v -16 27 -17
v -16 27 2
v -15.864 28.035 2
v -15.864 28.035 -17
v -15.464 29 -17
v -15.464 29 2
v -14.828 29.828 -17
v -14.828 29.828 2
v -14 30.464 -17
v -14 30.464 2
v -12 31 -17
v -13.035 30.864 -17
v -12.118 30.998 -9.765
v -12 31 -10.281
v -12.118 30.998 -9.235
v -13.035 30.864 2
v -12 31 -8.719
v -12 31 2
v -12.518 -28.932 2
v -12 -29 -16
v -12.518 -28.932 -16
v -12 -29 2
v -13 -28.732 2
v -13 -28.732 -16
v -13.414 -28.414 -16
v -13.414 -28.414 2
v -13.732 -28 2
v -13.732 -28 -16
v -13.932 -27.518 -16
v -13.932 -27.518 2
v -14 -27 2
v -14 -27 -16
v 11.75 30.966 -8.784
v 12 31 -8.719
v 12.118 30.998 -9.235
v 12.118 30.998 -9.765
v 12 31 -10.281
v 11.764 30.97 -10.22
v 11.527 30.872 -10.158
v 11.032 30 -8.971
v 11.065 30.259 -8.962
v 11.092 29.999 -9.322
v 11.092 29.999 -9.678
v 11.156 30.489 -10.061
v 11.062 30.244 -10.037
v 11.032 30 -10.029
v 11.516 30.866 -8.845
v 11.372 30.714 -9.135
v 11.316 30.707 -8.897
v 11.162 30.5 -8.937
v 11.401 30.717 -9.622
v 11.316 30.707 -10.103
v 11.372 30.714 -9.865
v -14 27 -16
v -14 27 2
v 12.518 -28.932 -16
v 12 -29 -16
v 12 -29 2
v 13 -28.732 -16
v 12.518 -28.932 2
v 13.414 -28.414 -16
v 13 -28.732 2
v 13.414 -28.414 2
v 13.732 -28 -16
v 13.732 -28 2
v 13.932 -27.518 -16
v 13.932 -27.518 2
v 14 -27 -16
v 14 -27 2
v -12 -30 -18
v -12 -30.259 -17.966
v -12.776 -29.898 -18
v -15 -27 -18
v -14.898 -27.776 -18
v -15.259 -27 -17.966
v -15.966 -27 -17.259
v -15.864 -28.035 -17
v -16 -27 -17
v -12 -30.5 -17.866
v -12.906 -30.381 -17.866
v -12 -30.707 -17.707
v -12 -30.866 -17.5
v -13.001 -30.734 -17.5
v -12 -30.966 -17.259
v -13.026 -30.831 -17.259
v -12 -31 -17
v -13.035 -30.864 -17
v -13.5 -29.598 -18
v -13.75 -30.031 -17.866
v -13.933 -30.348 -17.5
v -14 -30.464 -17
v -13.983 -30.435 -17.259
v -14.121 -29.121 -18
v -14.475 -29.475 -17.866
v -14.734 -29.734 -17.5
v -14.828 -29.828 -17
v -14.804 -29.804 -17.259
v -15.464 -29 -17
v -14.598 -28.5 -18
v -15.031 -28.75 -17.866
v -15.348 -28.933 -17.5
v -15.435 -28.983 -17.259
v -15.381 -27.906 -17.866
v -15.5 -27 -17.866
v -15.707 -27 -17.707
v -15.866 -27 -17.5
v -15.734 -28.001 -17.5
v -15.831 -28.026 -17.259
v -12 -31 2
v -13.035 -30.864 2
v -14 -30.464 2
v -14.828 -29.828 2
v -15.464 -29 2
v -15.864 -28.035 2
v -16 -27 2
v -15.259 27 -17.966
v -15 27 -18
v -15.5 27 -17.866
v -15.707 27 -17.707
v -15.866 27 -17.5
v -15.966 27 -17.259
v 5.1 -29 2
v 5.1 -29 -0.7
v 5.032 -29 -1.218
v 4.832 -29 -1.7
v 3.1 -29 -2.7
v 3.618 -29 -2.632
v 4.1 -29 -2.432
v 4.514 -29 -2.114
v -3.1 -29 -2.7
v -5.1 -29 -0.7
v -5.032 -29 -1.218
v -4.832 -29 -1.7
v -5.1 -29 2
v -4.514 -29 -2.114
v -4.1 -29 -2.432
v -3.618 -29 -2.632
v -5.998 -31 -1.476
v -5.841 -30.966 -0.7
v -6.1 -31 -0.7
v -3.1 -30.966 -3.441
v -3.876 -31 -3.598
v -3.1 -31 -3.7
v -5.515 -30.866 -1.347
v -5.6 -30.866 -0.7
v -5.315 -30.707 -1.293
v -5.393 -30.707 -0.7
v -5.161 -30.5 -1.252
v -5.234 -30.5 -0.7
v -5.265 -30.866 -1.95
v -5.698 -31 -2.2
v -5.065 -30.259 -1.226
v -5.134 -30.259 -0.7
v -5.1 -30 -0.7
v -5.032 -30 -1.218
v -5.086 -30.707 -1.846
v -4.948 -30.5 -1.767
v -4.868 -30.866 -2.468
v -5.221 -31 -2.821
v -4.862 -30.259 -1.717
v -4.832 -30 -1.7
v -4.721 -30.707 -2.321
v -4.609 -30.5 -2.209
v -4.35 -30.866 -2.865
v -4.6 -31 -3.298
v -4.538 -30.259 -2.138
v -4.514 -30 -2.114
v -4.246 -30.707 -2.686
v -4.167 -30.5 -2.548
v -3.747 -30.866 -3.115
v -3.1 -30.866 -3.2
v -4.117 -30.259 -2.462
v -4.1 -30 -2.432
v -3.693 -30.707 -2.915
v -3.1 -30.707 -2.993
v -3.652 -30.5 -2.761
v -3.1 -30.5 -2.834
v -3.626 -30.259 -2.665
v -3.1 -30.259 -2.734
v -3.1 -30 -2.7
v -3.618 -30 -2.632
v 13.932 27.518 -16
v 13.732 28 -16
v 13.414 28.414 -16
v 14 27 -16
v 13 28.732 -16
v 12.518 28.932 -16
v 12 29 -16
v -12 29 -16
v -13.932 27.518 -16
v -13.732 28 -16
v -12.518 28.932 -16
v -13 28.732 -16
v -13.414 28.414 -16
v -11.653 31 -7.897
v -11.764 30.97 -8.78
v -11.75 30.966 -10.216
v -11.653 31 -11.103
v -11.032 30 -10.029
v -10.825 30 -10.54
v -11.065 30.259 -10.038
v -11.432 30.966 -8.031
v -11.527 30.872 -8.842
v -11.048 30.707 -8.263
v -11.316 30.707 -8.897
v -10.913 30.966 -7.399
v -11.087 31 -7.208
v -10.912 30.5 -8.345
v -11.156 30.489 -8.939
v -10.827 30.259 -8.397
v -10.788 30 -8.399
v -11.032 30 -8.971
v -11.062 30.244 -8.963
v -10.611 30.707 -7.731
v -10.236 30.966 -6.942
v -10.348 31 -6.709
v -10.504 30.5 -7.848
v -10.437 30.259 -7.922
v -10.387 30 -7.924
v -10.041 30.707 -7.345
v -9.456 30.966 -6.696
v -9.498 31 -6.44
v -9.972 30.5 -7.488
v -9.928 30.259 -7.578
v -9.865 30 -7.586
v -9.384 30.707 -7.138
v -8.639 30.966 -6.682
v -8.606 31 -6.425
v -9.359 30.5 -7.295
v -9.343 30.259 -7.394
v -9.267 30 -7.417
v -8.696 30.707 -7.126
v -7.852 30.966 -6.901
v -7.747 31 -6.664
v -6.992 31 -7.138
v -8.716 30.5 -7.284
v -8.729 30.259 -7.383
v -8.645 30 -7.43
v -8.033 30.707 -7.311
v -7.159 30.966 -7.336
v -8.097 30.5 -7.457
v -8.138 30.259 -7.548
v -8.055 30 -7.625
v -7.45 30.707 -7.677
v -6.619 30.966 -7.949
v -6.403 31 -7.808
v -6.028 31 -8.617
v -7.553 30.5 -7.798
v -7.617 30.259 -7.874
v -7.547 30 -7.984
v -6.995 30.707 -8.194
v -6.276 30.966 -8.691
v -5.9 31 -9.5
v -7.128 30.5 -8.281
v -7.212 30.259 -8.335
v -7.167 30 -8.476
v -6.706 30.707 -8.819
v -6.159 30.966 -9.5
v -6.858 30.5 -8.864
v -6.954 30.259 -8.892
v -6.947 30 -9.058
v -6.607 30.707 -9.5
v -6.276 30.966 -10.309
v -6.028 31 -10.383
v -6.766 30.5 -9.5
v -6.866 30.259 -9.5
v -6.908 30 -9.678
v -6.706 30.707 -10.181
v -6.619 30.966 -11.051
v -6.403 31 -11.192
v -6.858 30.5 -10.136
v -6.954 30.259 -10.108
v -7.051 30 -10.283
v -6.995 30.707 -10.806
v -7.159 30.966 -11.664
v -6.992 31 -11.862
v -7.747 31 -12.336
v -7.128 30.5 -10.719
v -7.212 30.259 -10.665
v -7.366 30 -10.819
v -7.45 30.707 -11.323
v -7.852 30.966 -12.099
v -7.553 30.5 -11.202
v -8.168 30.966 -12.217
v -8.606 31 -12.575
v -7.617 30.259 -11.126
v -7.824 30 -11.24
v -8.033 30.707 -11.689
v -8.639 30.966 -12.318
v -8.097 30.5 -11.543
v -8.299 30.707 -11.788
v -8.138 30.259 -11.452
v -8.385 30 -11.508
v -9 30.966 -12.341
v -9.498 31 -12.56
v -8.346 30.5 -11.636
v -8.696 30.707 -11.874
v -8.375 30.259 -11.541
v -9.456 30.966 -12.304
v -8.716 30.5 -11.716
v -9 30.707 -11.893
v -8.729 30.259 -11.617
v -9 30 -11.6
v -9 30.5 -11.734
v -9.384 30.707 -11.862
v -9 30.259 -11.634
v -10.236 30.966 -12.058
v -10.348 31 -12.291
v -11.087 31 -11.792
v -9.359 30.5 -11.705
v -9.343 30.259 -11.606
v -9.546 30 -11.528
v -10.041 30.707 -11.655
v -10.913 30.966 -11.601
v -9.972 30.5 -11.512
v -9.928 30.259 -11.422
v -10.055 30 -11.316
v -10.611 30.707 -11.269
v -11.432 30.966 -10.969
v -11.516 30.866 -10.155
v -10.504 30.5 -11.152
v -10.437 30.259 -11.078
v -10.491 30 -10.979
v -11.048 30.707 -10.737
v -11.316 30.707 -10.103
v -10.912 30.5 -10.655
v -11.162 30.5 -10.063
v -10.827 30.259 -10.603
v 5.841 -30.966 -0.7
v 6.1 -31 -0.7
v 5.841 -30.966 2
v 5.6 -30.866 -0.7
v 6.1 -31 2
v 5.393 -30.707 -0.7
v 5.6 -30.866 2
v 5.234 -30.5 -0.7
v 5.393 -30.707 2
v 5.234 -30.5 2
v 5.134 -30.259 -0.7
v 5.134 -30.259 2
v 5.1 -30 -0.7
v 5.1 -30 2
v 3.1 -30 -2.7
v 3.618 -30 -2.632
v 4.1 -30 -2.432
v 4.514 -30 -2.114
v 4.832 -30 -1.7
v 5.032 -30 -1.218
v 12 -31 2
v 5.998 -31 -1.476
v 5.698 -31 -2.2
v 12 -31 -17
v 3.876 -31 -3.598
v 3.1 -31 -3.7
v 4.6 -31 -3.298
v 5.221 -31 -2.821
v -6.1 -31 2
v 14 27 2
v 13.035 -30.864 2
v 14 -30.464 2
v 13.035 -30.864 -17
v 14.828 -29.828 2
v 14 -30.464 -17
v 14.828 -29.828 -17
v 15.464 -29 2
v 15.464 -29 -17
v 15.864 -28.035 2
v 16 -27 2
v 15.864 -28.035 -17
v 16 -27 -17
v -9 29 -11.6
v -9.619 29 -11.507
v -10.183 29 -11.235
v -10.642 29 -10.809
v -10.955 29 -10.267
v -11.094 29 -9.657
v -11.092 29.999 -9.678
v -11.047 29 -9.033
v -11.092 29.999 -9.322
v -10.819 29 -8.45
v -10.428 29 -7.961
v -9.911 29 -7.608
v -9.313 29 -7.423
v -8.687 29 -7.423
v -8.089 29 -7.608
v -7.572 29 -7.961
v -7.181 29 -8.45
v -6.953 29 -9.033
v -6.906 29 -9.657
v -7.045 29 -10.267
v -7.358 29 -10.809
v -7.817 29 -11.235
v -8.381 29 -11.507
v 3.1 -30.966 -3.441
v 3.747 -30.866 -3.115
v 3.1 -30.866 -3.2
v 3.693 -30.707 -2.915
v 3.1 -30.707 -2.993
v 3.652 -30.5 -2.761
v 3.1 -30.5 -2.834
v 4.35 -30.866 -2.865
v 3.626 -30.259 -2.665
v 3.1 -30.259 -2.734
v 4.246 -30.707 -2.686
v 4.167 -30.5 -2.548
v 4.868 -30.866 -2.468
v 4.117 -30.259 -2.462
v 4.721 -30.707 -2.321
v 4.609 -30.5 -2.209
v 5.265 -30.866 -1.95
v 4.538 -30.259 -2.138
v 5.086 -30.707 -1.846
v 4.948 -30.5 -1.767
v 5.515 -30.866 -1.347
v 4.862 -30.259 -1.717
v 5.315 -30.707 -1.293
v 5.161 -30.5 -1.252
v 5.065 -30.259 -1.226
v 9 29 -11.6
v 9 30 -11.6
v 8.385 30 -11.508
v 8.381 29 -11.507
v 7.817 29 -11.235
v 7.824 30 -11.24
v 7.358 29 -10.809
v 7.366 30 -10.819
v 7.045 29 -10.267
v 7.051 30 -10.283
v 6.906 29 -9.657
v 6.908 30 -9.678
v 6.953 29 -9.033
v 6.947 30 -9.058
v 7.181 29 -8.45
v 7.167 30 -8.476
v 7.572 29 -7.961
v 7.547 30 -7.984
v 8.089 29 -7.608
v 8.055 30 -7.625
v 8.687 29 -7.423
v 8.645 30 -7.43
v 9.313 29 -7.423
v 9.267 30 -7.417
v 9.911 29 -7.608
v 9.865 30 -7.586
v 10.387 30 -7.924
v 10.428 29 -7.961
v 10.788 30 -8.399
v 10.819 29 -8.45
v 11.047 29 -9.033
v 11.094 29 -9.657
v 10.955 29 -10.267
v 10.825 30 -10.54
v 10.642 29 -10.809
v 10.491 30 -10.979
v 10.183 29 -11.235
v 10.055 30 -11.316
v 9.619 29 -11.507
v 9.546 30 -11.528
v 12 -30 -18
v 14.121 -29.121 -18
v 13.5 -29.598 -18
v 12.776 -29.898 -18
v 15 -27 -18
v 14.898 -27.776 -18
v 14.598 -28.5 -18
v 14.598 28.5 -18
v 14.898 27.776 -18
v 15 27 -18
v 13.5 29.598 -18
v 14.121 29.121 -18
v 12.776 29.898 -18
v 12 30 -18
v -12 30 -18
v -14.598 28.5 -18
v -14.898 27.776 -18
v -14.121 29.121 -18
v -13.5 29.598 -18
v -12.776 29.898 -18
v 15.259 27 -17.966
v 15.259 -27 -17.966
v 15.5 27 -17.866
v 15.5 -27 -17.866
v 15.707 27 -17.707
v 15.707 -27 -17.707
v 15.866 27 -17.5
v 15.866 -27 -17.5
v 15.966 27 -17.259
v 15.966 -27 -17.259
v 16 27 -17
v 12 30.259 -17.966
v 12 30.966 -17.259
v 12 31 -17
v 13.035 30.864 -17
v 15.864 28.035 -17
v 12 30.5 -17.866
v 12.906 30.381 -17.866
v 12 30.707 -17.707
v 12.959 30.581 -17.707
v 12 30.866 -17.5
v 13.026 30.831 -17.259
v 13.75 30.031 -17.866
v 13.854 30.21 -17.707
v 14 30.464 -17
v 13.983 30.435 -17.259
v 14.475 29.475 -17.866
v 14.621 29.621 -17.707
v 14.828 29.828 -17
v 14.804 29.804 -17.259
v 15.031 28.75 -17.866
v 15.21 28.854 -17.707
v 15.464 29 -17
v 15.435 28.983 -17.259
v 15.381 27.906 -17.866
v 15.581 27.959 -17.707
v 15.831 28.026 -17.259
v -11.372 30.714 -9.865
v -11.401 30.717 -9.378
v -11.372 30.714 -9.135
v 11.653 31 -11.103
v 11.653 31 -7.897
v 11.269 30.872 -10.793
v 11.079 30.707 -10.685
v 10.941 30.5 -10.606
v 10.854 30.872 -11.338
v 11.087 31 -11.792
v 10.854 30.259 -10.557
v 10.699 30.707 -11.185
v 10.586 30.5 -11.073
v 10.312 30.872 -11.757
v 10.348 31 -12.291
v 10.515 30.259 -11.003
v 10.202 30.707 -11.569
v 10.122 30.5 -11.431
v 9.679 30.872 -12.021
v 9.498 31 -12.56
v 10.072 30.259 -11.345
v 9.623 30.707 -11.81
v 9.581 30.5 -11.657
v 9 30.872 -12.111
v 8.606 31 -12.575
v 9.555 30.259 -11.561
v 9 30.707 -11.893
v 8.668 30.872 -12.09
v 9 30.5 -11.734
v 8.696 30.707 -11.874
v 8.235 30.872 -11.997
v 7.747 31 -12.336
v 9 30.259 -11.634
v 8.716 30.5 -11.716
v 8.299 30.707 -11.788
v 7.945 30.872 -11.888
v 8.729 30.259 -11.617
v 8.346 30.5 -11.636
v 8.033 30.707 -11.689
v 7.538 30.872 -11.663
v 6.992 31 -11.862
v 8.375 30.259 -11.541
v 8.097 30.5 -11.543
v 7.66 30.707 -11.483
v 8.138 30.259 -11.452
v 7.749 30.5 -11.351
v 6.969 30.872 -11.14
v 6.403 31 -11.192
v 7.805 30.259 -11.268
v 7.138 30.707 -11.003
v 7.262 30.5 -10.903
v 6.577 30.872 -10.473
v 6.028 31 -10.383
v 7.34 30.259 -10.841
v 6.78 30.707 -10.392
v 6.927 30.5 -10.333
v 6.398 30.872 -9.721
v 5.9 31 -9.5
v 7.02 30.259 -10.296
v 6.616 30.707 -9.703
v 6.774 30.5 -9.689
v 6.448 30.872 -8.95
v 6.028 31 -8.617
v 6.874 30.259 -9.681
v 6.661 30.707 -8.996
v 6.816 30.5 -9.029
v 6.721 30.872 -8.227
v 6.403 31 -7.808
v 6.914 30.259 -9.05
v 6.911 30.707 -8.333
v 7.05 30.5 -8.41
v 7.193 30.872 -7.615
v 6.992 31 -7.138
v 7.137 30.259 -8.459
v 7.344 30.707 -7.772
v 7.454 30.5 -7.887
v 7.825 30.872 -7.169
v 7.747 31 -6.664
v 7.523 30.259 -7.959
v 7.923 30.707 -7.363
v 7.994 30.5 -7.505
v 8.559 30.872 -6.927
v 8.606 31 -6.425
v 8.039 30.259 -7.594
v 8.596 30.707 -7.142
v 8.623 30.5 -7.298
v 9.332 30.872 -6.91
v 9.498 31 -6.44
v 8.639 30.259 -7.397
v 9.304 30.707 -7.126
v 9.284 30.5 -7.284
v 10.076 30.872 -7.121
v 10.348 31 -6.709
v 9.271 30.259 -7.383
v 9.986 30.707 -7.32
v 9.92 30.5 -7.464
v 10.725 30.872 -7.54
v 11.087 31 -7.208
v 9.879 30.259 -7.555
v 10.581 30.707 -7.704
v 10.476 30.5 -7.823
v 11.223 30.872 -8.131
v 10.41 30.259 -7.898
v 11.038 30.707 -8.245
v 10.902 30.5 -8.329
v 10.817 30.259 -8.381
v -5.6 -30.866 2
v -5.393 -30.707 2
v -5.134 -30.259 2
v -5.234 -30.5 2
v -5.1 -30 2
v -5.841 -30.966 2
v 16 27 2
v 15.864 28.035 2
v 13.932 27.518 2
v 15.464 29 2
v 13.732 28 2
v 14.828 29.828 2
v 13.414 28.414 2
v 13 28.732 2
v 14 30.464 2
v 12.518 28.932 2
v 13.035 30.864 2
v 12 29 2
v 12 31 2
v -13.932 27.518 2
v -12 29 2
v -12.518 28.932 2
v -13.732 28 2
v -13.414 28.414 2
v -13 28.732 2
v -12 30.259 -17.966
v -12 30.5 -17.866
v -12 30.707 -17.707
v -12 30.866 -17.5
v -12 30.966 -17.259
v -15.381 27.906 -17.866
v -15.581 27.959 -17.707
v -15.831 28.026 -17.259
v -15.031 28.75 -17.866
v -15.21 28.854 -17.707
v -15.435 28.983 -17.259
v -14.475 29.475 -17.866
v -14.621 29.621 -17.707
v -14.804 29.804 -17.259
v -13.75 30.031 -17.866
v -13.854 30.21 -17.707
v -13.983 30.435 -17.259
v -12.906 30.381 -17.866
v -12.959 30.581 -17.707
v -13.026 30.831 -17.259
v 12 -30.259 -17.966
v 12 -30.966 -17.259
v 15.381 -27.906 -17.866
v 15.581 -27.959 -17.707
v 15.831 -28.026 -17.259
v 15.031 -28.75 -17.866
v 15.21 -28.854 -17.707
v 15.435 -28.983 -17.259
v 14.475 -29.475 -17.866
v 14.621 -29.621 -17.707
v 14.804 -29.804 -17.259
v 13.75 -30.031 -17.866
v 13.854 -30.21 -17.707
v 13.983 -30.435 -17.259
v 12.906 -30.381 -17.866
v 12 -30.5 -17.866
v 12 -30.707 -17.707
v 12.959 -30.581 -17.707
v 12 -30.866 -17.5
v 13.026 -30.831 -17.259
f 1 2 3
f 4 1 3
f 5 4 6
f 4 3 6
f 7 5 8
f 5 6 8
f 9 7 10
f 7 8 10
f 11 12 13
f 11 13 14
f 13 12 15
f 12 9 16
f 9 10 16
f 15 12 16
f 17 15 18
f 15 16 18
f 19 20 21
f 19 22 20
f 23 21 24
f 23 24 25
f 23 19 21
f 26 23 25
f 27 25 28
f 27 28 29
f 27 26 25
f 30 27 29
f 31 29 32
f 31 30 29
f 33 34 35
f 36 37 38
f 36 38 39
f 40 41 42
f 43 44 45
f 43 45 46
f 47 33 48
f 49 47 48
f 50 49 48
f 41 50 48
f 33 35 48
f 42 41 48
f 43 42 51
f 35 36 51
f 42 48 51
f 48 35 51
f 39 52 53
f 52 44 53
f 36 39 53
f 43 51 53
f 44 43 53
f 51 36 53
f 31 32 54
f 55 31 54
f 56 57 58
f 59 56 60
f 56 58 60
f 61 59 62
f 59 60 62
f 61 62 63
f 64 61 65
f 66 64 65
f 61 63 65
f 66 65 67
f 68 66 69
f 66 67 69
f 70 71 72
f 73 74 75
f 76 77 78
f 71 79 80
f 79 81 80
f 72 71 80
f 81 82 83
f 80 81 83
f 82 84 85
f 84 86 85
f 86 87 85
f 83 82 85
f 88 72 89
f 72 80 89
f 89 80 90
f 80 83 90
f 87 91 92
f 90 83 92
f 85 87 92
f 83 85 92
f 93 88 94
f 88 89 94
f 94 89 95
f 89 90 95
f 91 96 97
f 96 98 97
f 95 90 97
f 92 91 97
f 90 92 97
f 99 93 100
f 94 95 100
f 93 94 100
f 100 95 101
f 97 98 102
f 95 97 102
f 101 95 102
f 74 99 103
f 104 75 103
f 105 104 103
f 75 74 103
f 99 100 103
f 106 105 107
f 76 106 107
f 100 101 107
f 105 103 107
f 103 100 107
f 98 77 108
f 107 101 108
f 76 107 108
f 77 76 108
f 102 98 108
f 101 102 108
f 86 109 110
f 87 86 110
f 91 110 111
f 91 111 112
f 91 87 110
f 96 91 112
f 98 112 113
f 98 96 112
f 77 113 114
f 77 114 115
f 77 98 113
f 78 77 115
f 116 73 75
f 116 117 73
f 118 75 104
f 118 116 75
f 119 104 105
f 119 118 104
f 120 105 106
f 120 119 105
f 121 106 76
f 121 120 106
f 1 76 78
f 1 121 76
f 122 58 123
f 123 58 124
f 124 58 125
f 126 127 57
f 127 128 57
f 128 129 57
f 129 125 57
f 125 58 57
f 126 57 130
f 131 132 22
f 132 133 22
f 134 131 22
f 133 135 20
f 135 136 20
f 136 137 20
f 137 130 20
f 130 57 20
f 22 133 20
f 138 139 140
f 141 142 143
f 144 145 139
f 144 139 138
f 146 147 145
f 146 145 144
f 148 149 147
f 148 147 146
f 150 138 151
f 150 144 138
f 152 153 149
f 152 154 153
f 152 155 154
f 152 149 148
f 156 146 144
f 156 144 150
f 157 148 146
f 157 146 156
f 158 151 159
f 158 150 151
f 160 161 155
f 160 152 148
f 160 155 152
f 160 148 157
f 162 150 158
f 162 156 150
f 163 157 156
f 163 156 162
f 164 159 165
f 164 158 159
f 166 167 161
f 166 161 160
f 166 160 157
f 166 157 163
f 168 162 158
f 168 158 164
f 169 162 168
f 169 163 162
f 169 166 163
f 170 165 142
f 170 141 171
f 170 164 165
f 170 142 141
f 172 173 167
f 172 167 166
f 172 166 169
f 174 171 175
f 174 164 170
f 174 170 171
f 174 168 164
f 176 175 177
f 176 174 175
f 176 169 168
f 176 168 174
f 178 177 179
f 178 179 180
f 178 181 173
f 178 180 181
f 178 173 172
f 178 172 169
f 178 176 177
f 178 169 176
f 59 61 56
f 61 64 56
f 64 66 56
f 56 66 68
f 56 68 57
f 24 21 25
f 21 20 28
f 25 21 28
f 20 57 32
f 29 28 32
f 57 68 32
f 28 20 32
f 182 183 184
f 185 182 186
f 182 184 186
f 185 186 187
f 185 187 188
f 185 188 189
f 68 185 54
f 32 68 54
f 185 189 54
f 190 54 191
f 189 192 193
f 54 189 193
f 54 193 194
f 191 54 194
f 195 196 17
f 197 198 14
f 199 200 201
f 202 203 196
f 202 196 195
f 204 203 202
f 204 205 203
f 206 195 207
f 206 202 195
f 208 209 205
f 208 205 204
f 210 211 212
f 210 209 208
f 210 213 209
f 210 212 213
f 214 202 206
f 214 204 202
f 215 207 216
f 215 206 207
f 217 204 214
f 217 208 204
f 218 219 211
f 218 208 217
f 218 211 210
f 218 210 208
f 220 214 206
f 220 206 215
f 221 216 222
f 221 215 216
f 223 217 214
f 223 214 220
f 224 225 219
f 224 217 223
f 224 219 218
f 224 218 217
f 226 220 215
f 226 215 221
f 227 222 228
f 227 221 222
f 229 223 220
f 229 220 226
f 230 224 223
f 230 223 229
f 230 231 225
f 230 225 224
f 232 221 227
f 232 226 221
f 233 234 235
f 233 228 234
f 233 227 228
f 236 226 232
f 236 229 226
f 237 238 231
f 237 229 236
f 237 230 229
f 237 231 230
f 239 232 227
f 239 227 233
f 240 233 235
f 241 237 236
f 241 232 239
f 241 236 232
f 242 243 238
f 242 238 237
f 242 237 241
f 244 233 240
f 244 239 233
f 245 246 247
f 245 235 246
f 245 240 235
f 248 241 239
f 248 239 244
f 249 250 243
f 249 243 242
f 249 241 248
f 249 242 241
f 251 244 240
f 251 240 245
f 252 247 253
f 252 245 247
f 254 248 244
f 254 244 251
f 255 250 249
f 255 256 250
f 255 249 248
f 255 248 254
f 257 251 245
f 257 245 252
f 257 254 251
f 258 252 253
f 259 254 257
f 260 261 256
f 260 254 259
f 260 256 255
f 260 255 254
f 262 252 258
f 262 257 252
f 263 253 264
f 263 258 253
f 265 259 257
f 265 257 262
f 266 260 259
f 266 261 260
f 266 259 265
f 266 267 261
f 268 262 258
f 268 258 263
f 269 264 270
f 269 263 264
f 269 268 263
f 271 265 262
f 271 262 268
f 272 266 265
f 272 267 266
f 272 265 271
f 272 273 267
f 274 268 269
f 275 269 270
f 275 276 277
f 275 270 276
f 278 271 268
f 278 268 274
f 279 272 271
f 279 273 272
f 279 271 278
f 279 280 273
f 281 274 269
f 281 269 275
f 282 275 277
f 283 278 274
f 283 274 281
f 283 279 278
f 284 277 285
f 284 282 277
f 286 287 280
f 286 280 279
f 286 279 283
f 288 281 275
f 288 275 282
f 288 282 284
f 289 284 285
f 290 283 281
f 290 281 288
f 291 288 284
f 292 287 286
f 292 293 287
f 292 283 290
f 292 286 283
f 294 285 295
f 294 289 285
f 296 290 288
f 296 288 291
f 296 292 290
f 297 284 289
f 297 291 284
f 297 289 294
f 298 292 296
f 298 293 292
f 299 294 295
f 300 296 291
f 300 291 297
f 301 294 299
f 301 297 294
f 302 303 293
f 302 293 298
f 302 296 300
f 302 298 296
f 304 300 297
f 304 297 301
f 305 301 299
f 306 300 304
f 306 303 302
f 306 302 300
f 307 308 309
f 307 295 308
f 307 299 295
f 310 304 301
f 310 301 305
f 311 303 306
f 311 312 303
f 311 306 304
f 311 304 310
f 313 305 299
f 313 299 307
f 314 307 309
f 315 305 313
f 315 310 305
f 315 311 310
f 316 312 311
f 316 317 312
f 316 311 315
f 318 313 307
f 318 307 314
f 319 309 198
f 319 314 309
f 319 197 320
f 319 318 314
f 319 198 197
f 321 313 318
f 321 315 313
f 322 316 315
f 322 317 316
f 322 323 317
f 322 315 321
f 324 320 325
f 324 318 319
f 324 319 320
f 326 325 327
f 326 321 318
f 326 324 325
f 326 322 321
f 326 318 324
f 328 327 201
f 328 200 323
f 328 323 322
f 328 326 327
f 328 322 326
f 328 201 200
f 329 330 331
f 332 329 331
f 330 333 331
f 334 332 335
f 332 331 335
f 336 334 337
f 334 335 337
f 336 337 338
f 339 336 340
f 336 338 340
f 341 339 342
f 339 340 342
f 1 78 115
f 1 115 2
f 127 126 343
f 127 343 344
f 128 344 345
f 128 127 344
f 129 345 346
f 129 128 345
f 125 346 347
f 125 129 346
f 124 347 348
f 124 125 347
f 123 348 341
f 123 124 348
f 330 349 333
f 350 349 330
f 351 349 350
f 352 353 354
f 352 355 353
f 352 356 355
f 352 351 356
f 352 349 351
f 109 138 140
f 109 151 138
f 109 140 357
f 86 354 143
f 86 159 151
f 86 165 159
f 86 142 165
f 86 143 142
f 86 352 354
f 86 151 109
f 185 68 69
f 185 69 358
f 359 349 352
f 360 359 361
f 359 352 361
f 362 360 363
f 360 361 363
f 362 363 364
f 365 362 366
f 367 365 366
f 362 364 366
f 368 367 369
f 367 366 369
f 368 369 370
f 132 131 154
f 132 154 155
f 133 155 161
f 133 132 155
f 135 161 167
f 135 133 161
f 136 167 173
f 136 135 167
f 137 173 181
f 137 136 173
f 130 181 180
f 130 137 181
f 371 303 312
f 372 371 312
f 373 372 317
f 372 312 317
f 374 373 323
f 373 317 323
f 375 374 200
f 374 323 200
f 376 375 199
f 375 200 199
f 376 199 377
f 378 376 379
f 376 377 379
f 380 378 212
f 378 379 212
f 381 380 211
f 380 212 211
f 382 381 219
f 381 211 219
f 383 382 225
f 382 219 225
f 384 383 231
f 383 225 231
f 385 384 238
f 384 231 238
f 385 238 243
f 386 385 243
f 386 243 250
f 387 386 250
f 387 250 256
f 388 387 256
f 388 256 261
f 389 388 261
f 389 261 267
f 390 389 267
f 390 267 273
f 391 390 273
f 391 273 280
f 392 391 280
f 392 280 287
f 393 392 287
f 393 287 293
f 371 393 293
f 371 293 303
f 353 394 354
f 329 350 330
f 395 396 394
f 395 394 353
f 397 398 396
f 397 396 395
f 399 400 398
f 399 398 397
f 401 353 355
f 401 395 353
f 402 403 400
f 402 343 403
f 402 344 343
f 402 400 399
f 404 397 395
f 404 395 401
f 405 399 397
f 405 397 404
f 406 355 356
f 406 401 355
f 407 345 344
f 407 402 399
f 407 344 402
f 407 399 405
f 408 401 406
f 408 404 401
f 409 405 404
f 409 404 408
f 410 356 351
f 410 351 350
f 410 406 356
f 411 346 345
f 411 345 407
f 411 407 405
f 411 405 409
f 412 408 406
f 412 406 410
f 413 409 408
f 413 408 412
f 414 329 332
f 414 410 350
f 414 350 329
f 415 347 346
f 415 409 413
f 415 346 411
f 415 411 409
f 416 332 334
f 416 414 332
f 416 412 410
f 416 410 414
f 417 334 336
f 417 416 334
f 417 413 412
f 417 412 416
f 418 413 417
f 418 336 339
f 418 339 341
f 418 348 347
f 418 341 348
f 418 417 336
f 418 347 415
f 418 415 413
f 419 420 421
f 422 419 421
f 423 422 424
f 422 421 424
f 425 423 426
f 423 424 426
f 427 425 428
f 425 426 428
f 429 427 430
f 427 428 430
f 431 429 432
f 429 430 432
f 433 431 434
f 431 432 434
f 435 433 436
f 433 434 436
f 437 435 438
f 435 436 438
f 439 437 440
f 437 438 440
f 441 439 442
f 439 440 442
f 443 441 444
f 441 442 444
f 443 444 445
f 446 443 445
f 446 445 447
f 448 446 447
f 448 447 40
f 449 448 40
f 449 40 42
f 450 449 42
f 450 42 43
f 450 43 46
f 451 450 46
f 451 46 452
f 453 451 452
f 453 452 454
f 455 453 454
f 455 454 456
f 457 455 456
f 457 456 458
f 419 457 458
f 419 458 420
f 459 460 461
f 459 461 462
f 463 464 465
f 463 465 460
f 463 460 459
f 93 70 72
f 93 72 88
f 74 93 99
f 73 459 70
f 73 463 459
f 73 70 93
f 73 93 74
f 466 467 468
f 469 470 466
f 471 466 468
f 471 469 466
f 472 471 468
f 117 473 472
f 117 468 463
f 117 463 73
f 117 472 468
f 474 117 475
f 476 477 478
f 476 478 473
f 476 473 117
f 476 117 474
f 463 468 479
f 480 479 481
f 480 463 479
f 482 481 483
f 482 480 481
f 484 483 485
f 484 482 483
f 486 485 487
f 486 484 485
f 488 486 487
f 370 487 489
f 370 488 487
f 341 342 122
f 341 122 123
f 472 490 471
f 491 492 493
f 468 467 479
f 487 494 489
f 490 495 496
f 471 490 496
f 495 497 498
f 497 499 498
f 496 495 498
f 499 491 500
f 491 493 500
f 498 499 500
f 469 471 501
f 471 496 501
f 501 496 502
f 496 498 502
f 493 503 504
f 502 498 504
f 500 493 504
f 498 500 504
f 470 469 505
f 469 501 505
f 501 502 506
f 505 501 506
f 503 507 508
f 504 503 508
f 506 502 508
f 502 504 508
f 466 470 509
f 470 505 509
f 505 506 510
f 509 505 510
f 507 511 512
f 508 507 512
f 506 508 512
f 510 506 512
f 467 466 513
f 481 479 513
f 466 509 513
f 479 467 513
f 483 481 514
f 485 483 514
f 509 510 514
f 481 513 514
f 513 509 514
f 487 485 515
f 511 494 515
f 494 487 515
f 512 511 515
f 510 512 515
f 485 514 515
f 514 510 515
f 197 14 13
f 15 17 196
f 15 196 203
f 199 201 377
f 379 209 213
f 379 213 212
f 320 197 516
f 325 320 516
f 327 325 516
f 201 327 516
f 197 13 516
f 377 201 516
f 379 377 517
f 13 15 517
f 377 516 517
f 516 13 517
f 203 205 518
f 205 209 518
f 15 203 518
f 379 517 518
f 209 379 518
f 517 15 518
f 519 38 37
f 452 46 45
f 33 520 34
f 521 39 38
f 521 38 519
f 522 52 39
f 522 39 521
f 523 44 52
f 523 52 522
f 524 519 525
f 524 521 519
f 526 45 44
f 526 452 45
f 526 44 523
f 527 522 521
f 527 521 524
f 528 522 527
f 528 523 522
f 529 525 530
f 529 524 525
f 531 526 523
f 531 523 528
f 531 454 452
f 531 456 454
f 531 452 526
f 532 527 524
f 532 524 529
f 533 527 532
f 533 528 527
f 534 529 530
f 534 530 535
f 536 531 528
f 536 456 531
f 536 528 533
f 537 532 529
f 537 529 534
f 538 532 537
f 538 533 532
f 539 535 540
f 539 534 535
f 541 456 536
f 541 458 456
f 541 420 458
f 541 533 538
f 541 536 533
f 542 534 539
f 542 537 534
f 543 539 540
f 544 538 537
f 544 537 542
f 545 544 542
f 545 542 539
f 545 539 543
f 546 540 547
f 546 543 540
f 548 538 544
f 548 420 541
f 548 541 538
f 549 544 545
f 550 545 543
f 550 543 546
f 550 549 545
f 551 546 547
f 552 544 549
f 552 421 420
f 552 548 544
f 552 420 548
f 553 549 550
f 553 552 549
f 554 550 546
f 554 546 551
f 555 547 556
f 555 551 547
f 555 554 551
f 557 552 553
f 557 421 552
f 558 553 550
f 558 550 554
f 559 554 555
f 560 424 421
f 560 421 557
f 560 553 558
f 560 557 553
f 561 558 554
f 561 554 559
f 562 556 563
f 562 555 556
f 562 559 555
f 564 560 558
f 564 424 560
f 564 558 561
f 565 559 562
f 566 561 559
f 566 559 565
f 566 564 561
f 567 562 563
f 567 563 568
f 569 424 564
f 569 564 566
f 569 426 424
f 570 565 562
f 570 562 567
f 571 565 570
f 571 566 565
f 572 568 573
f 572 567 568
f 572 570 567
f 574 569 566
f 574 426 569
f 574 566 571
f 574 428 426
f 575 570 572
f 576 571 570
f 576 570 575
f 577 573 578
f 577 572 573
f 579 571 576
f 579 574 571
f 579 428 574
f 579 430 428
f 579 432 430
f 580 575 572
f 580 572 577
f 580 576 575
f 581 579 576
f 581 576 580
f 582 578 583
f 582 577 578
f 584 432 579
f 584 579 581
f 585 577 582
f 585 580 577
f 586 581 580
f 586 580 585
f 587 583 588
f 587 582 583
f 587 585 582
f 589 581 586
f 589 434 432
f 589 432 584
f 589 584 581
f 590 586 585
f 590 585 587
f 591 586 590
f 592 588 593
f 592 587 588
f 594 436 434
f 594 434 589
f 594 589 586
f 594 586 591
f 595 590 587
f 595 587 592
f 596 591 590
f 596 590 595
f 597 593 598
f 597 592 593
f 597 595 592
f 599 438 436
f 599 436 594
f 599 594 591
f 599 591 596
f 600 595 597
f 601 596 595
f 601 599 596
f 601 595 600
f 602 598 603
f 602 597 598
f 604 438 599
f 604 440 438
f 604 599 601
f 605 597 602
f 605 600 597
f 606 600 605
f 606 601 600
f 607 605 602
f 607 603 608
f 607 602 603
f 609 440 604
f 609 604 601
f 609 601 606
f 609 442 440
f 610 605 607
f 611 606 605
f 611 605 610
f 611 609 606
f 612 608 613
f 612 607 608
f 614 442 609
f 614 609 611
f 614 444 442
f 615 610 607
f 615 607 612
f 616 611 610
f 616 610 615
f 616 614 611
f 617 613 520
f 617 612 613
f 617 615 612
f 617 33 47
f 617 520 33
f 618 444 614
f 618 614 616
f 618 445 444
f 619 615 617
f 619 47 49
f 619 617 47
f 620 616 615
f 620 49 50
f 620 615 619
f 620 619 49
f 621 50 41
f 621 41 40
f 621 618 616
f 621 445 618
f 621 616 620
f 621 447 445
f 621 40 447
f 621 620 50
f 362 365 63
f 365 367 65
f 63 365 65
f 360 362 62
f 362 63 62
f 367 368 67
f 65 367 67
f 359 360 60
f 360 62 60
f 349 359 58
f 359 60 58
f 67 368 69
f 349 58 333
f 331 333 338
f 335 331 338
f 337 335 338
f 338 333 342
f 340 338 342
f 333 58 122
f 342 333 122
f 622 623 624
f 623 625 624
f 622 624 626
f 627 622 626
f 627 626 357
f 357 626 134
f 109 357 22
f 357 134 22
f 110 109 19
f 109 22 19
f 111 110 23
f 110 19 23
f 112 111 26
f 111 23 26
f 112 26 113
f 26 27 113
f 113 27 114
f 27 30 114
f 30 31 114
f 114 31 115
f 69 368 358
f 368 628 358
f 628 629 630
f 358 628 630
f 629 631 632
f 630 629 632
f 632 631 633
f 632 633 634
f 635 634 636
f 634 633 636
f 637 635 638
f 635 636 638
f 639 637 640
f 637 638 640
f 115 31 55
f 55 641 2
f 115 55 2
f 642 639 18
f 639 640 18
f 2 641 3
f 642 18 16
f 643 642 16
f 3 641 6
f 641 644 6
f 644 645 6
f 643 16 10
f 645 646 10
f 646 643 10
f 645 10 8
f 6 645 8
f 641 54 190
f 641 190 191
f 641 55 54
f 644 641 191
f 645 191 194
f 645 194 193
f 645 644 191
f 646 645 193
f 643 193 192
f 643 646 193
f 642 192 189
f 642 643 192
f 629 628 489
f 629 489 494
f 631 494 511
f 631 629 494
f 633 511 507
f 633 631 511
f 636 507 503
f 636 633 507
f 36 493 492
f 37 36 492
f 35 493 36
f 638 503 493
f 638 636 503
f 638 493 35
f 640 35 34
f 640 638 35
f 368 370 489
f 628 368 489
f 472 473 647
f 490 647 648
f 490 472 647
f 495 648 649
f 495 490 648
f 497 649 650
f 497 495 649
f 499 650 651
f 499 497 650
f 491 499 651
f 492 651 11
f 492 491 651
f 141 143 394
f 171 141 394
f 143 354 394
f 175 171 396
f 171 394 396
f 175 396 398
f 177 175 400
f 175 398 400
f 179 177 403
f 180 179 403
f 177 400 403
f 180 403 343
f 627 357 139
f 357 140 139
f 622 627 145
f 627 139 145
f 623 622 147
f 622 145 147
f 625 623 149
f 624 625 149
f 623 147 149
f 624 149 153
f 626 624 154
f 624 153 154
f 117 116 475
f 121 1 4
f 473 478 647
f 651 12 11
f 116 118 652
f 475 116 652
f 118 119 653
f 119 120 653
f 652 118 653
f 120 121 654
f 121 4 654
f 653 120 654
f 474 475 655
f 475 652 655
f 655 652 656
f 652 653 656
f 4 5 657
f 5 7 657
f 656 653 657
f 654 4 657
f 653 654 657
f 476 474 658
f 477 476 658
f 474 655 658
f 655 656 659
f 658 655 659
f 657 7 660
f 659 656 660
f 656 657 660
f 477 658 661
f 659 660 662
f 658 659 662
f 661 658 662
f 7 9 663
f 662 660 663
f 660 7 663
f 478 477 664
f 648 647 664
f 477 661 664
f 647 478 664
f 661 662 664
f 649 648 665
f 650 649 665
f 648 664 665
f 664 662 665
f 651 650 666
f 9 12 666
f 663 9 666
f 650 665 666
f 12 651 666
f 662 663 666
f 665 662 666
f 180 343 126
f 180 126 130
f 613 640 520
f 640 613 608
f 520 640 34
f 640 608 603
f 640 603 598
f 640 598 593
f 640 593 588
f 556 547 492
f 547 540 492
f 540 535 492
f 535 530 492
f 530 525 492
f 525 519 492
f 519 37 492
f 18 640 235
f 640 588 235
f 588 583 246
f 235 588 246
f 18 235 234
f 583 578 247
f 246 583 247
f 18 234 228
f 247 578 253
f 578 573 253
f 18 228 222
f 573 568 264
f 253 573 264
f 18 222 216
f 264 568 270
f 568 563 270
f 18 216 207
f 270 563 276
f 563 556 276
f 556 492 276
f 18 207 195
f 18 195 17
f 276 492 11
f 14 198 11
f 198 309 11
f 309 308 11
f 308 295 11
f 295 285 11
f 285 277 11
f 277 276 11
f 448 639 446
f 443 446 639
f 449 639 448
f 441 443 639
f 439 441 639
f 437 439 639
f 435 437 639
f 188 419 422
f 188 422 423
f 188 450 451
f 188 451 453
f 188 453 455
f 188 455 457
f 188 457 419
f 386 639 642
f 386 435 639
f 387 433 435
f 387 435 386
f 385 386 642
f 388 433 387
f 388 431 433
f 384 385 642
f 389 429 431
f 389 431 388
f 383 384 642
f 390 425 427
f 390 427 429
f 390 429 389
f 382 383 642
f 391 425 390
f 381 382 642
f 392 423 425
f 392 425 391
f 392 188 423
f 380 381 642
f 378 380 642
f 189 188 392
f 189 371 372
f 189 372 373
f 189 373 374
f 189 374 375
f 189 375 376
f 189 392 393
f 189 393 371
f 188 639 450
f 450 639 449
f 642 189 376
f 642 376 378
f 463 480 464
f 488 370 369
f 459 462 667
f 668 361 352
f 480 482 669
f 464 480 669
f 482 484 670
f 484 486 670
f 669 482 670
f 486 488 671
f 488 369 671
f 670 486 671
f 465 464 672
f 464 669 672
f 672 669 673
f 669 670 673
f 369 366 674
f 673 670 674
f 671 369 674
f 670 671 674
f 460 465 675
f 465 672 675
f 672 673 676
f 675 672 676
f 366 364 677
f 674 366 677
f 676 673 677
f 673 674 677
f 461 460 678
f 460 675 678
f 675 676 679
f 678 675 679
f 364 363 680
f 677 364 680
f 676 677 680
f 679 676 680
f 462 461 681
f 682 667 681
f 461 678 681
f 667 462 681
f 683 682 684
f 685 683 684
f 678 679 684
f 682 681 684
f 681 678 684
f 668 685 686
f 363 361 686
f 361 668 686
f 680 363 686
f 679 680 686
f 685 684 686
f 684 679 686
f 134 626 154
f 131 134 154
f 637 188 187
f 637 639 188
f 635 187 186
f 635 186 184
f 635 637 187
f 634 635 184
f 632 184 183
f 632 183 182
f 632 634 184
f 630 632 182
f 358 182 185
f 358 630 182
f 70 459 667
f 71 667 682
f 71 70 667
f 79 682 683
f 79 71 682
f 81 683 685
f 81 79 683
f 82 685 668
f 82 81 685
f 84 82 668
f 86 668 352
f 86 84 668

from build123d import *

# Parameters (mm, degrees)
SKETCH1_W             = 32
SKETCH1_H             = 62
BOSS_EXTRUDE4_DEPTH   = 2
SKETCH2_W             = 32
SKETCH2_H             = 62
SKETCH2_W_2           = 28
SKETCH2_H_2           = 58
BOSS_EXTRUDE5_DEPTH   = 18
SKETCH3_R             = 2.1
CUT_EXTRUDE1_DEPTH    = 10
SKETCH5_W             = 10.2
SKETCH5_H             = 4.7
CUT_EXTRUDE2_DEPTH    = 2
FILLET13_R            = 2
FILLET14_R            = 4
FILLET15_R            = 1
BODY_MOVE_COPY1_ANGLE = 180


with BuildPart() as part:
    # Sketch1 → Boss-Extrude4 (new body)
    with BuildSketch(Plane.XY):
        Rectangle(SKETCH1_W, SKETCH1_H)
    extrude(amount=BOSS_EXTRUDE4_DEPTH)

    # Sketch2 → Boss-Extrude5 (add)
    with BuildSketch(Plane.XY):
        Rectangle(SKETCH2_W, SKETCH2_H)
        Rectangle(SKETCH2_W_2, SKETCH2_H_2, mode=Mode.SUBTRACT)
    extrude(amount=-BOSS_EXTRUDE5_DEPTH)

    # Sketch3 → Cut-Extrude1 (cut)
    with BuildSketch(Plane(origin=(0, 31, 0), x_dir=(1, 0, 0), z_dir=(0, 1, 0))):
        with Locations(Location((-9, 6.5, 0), (0, 0, 270))):
            Circle(SKETCH3_R)
        with Locations(Location((9, 6.5, 0), (0, 0, 270))):
            Circle(SKETCH3_R)
    extrude(amount=-CUT_EXTRUDE1_DEPTH, mode=Mode.SUBTRACT)

    # Sketch5 → Cut-Extrude2 (cut)
    with BuildSketch(Plane.XZ.offset(31)):
        with Locations((0, -15.65)):
            Rectangle(SKETCH5_W, SKETCH5_H)
    extrude(amount=-CUT_EXTRUDE2_DEPTH, mode=Mode.SUBTRACT)

    # Fillet13
    fillet13_edges = [part.edges().sort_by_distance(p)[0] for p in [
        (14, 29, -9),
        (-14, 29, -9),
        (-14, -29, -9),
        (14, -29, -9),
        (-5.1, -30, -13.3),
        (5.1, -30, -13.3),
    ]]
    fillet(fillet13_edges, radius=FILLET13_R)

    # Fillet14
    fillet14_edges = [part.edges().sort_by_distance(p)[0] for p in [
        (16, -31, -8),
        (-16, -31, -8),
        (-16, 31, -8),
        (16, 31, -8),
    ]]
    fillet(fillet14_edges, radius=FILLET14_R)

    # Fillet15
    fillet15_edges = [part.edges().sort_by_distance(p)[0] for p in [
        (16, 0, 2),
        (0, -31, 2),
        (0, 31, 2),
        (-16, 0, 2),
        (-14.828427125, -29.828427125, 2),
        (-14.828427125, 29.828427125, 2),
        (14.828427125, 29.828427125, 2),
        (14.828427125, -29.828427125, 2),
        (-9, 31, -8.6),
        (9, 31, -8.6),
        (5.1, -31, -16.65),
        (-5.1, -31, -16.65),
        (0, -31, -13.3),
        (-4.514213562, -31, -13.885786438),
        (4.514213562, -31, -13.885786438),
    ]]
    fillet(fillet15_edges, radius=FILLET15_R)


with BuildPart() as part_1:
    # Body-Move/Copy1: moved
    add(part.part.rotate(Axis((0, 0, -8), (0, 1, 0)), BODY_MOVE_COPY1_ANGLE))


solid = part_1.part
